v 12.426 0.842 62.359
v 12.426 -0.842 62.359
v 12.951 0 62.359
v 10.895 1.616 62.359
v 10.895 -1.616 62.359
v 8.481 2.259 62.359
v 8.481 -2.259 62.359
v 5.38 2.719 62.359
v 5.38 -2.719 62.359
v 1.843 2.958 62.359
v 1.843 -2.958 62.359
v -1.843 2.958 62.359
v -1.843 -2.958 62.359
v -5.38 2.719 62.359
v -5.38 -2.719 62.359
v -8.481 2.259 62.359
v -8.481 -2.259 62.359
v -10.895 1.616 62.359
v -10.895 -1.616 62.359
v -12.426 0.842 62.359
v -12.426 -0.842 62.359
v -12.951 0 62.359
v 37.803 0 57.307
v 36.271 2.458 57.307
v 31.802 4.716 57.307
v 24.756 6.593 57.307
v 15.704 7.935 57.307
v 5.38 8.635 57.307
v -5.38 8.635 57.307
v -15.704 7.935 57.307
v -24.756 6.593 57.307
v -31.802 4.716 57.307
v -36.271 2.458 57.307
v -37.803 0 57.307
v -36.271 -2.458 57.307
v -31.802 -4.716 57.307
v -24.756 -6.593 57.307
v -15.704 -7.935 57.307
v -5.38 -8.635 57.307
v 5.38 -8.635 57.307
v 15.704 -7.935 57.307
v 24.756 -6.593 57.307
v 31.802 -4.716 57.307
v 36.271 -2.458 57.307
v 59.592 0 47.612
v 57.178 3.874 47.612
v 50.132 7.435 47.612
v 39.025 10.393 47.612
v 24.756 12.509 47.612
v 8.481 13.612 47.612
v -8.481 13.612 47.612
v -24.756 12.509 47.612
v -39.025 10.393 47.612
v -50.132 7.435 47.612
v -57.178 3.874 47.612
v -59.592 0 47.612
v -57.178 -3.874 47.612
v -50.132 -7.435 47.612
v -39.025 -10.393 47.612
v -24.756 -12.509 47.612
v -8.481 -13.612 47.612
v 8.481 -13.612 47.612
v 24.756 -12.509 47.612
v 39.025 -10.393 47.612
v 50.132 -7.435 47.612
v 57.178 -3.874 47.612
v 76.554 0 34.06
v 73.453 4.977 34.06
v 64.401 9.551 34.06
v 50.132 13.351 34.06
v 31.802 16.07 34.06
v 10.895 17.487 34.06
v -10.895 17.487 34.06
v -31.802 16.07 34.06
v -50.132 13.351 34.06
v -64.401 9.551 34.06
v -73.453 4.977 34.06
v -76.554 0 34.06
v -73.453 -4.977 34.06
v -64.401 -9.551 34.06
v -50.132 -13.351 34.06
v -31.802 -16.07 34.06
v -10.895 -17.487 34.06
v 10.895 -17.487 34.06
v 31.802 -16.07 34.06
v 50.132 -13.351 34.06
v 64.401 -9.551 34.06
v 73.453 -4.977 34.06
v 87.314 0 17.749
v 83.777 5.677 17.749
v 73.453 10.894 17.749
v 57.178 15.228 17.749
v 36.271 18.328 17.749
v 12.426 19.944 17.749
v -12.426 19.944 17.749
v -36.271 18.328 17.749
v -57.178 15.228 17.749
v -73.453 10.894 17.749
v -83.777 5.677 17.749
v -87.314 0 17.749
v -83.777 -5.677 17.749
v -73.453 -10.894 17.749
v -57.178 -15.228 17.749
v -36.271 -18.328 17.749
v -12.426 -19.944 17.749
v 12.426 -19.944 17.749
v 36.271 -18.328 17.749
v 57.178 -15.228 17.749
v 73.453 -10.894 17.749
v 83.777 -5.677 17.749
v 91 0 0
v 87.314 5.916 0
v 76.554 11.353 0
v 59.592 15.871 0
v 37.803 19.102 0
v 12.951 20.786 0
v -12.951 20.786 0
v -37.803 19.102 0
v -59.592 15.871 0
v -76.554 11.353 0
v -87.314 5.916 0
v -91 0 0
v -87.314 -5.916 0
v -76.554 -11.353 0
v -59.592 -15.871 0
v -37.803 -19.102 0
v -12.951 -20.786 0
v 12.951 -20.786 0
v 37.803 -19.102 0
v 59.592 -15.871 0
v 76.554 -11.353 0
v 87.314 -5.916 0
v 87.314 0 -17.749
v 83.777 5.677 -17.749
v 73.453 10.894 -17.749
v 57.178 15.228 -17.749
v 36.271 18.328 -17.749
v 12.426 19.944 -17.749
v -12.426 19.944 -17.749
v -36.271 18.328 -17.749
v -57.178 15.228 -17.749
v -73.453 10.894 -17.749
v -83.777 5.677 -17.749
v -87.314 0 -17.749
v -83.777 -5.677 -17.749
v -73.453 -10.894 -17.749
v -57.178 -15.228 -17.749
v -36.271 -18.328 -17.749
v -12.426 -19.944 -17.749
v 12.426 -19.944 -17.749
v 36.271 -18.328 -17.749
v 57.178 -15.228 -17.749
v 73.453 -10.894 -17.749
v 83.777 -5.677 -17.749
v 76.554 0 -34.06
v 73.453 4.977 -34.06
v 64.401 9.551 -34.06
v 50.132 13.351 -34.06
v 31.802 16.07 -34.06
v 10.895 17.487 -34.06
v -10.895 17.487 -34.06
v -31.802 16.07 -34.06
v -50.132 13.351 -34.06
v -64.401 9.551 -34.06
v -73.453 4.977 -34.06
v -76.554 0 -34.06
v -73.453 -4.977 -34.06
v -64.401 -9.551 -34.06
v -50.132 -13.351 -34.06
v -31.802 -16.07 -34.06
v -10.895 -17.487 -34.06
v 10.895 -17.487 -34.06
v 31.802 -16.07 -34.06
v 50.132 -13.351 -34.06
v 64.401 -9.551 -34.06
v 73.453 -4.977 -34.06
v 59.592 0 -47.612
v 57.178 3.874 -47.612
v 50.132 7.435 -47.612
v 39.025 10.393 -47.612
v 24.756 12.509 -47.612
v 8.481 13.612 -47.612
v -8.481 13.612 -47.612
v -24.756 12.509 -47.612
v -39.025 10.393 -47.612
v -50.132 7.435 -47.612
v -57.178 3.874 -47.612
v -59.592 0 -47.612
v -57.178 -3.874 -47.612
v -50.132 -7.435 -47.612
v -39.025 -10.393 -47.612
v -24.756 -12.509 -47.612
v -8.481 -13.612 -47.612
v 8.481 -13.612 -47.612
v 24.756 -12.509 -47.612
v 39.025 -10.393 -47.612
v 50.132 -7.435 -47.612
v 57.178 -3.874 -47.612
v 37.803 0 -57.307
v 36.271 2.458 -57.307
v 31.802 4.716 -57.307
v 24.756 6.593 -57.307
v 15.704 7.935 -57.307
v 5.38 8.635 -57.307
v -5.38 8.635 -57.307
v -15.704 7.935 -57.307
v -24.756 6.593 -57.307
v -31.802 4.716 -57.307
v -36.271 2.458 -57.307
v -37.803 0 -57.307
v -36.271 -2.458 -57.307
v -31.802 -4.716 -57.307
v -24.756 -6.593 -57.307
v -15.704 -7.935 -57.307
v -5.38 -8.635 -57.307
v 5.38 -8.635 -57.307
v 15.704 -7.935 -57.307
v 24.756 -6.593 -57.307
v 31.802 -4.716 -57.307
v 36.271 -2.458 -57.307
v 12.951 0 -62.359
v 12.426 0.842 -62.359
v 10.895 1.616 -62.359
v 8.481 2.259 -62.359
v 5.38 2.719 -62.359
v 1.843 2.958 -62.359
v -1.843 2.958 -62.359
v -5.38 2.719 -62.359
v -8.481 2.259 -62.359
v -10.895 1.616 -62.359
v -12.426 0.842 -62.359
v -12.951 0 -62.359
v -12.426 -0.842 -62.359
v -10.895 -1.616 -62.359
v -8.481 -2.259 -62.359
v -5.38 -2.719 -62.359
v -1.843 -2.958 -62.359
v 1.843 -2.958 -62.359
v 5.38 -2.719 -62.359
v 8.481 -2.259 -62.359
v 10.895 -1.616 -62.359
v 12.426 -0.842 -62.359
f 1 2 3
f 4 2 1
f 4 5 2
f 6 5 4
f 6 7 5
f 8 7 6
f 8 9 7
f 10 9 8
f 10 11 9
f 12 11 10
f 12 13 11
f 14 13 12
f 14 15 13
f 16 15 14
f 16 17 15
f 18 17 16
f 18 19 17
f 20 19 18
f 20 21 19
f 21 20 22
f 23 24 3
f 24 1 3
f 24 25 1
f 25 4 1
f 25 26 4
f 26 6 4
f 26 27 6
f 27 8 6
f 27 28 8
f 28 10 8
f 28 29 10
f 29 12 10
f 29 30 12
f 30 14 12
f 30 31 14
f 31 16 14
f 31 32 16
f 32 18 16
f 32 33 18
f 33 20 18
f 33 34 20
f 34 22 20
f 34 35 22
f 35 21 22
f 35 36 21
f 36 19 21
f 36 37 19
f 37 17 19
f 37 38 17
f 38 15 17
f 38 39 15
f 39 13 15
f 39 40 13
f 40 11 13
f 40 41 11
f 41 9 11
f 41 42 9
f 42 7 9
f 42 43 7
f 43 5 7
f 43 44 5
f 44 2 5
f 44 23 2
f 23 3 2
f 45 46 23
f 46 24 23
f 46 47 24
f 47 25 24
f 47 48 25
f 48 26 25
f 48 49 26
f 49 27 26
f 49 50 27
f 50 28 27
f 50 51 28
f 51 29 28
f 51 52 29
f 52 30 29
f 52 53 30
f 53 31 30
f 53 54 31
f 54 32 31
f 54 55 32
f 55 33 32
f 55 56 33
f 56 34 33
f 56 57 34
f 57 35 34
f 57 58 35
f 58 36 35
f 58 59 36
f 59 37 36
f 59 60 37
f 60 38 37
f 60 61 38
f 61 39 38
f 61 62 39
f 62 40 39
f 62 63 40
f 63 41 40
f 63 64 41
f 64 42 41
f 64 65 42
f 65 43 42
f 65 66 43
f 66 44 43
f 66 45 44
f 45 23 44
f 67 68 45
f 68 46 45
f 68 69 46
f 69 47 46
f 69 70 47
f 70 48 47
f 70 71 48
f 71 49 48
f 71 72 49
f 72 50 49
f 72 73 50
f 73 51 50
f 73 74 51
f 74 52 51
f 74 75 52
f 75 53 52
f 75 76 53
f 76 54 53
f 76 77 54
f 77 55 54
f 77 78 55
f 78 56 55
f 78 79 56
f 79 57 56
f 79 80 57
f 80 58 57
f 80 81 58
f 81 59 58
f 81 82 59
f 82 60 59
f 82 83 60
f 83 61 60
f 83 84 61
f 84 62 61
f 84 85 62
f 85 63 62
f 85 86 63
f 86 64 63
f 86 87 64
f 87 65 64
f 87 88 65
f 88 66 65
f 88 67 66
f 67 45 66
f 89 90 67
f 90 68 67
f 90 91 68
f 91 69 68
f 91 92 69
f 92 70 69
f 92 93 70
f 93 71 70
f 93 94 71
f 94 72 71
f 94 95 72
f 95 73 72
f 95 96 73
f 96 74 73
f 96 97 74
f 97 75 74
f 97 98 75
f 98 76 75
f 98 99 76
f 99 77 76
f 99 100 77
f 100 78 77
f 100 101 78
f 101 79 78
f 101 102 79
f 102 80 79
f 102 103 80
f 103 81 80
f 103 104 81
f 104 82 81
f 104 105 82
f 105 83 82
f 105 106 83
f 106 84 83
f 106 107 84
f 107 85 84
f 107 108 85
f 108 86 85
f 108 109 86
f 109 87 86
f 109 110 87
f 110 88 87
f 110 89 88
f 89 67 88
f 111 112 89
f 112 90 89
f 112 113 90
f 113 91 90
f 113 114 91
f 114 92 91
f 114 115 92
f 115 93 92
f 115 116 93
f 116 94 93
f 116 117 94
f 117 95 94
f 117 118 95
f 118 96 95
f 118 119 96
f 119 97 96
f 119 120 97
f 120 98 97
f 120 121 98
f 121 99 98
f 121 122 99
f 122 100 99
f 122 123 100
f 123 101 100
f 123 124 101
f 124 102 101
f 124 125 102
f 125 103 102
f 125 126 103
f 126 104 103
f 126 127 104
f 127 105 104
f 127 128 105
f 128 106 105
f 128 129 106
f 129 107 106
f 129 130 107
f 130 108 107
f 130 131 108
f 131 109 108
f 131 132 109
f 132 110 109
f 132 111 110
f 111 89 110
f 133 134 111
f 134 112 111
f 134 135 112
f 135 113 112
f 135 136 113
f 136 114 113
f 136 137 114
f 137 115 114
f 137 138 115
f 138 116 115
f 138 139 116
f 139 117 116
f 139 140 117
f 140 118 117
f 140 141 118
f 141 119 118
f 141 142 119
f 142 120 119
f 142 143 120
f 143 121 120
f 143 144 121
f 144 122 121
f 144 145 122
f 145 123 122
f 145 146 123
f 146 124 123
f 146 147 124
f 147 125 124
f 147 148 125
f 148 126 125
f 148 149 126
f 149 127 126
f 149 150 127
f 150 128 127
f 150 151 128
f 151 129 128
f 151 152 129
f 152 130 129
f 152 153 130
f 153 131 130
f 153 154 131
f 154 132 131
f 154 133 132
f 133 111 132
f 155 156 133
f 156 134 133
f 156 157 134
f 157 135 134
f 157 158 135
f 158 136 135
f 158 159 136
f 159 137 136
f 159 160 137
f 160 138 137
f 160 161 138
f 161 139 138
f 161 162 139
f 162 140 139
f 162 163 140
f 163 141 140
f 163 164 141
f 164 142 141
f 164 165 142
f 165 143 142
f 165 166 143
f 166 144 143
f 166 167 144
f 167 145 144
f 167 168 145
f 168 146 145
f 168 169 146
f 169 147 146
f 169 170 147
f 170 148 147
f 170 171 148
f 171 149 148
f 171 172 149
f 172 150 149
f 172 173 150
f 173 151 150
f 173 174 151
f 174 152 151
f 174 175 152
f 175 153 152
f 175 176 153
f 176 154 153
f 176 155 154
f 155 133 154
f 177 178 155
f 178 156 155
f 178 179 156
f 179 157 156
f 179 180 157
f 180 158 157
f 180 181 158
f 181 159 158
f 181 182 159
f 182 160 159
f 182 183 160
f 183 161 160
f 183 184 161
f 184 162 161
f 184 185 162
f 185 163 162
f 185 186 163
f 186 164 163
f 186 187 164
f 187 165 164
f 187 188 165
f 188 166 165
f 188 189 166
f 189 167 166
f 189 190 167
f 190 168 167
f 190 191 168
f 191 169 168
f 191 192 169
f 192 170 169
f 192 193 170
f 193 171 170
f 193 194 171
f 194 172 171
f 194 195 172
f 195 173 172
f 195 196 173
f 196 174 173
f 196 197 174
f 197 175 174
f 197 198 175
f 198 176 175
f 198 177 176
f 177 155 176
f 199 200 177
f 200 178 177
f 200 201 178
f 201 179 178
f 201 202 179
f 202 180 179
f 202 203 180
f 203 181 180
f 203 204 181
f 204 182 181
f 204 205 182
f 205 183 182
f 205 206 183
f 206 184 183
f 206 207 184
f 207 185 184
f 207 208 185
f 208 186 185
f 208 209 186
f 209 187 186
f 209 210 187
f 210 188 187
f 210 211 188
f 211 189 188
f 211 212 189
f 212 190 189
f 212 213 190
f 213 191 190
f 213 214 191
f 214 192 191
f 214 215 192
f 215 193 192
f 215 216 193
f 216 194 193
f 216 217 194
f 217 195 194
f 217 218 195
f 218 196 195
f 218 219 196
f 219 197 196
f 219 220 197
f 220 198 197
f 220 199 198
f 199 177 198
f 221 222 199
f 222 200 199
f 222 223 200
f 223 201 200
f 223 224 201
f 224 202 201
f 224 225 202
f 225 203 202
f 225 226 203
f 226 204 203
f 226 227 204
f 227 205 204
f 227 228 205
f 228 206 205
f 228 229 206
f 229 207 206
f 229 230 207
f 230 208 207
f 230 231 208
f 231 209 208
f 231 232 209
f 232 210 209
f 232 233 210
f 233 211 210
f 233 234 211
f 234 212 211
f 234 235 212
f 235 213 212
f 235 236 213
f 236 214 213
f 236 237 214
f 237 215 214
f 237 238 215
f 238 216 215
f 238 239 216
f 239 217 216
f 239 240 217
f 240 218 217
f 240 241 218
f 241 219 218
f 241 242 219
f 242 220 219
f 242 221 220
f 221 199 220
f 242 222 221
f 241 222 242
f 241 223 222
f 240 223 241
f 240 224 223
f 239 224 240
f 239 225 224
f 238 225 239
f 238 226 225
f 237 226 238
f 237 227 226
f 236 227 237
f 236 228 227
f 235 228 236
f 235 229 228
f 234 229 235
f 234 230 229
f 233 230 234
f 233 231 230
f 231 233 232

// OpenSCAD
// Generated by SolidPython 1.0.1 on 2020-07-29 00:46:50


scale(v = [13, 3, 9]) {
	sphere(r = 7);
}
/***********************************************
*********      SolidPython code:      **********
************************************************
 
# import packages: SolidPython
from solid import *
from solid.utils import *
from itertools import chain, combinations, permutations


class Resize:

    def __init__(self, scad_file):
        self.scad_file = scad_file
        #self.scad_file = import_scad(scad_file)
        # cone/cylinder param:
        self.r1 = 0
        self.r2 = 0
        self.h = 0
        # rectangular prism param:
        self.w = 0
        self.l = 0
        # ellipse param:
        self.r = 0

    # import OpenScad code (file name corresponds to shape)


    # classify shape + parameters
    def assign(self, param1, param2, param3):
        if self.scad_file == 'cone.scad':
            self.r1 = param1
            self.r2 = param2
            self.h = param3
        elif self.scad_file == 'cylinder.scad':
            self.r1 = param1
            self.r2 = param2
            self.h = param3
        elif self.scad_file == 'rectangularPrism.scad':
            self.h = param1
            self.l = param2
            self.w = param3
        else:
            self.r = param1
            self.h = param2

    # resize parameters
    def iterate(self):
        x = range(3, 20, 2)
        i = 1
        if self.scad_file == 'cone.scad':
            tempList = list(permutations(x, 2))
            for temp in tempList:
                param1 = temp[0]
                param2 = temp[1]
                filepath = 'produced_scad_files/' + 'cone' + str(param1) + '_' + str(param2) + '_' + '.scad'
                scad_render_to_file(cylinder(h=param1, r1=param2, r2=0), filepath)

        elif self.scad_file == 'cylinder.scad':
            tempList = list(permutations(x, 3))
            for temp in tempList:
                param1 = temp[0]
                param2 = temp[1]
                filepath = 'produced_scad_files/' + 'cylinder' + str(param1) + '_' + str(param2) + '_' + '.scad'
                scad_render_to_file(cylinder(h=param1, r1=param2, r2=param2), filepath)

        elif self.scad_file == 'rectangularPrism.scad':
            tempList = list(permutations(x, 3))
            for temp in tempList:
                param1 = temp[0]
                param2 = temp[1]
                param3 = temp[2]
                filepath = 'produced_scad_files/' + 'rectangularPrism' + str(param1) + '_' + str(param2) + '_' + str(
                    param3) + '.scad'
                scad_render_to_file(cube(size=(param1, param2, param3)), filepath)

        elif self.scad_file == 'ellipse.scad':
            tempList = list(permutations(x, 4))
            for temp in tempList:
                param1 = temp[0]
                param2 = temp[1]
                param3 = temp[2]
                param4 = temp[3]
                filepath = 'produced_scad_files/' + 'ellipse' + str(param1) + '_' + str(param2) + '_' + str(param3) + '_' + str(param4) + '.scad'
                scad_render_to_file(scale([param1, param2, param3])(sphere(r=param4)), filepath)

    def render_to_scadfile(self):
        scad_render_to_file(scad, 'example.scad') 
 
************************************************/
